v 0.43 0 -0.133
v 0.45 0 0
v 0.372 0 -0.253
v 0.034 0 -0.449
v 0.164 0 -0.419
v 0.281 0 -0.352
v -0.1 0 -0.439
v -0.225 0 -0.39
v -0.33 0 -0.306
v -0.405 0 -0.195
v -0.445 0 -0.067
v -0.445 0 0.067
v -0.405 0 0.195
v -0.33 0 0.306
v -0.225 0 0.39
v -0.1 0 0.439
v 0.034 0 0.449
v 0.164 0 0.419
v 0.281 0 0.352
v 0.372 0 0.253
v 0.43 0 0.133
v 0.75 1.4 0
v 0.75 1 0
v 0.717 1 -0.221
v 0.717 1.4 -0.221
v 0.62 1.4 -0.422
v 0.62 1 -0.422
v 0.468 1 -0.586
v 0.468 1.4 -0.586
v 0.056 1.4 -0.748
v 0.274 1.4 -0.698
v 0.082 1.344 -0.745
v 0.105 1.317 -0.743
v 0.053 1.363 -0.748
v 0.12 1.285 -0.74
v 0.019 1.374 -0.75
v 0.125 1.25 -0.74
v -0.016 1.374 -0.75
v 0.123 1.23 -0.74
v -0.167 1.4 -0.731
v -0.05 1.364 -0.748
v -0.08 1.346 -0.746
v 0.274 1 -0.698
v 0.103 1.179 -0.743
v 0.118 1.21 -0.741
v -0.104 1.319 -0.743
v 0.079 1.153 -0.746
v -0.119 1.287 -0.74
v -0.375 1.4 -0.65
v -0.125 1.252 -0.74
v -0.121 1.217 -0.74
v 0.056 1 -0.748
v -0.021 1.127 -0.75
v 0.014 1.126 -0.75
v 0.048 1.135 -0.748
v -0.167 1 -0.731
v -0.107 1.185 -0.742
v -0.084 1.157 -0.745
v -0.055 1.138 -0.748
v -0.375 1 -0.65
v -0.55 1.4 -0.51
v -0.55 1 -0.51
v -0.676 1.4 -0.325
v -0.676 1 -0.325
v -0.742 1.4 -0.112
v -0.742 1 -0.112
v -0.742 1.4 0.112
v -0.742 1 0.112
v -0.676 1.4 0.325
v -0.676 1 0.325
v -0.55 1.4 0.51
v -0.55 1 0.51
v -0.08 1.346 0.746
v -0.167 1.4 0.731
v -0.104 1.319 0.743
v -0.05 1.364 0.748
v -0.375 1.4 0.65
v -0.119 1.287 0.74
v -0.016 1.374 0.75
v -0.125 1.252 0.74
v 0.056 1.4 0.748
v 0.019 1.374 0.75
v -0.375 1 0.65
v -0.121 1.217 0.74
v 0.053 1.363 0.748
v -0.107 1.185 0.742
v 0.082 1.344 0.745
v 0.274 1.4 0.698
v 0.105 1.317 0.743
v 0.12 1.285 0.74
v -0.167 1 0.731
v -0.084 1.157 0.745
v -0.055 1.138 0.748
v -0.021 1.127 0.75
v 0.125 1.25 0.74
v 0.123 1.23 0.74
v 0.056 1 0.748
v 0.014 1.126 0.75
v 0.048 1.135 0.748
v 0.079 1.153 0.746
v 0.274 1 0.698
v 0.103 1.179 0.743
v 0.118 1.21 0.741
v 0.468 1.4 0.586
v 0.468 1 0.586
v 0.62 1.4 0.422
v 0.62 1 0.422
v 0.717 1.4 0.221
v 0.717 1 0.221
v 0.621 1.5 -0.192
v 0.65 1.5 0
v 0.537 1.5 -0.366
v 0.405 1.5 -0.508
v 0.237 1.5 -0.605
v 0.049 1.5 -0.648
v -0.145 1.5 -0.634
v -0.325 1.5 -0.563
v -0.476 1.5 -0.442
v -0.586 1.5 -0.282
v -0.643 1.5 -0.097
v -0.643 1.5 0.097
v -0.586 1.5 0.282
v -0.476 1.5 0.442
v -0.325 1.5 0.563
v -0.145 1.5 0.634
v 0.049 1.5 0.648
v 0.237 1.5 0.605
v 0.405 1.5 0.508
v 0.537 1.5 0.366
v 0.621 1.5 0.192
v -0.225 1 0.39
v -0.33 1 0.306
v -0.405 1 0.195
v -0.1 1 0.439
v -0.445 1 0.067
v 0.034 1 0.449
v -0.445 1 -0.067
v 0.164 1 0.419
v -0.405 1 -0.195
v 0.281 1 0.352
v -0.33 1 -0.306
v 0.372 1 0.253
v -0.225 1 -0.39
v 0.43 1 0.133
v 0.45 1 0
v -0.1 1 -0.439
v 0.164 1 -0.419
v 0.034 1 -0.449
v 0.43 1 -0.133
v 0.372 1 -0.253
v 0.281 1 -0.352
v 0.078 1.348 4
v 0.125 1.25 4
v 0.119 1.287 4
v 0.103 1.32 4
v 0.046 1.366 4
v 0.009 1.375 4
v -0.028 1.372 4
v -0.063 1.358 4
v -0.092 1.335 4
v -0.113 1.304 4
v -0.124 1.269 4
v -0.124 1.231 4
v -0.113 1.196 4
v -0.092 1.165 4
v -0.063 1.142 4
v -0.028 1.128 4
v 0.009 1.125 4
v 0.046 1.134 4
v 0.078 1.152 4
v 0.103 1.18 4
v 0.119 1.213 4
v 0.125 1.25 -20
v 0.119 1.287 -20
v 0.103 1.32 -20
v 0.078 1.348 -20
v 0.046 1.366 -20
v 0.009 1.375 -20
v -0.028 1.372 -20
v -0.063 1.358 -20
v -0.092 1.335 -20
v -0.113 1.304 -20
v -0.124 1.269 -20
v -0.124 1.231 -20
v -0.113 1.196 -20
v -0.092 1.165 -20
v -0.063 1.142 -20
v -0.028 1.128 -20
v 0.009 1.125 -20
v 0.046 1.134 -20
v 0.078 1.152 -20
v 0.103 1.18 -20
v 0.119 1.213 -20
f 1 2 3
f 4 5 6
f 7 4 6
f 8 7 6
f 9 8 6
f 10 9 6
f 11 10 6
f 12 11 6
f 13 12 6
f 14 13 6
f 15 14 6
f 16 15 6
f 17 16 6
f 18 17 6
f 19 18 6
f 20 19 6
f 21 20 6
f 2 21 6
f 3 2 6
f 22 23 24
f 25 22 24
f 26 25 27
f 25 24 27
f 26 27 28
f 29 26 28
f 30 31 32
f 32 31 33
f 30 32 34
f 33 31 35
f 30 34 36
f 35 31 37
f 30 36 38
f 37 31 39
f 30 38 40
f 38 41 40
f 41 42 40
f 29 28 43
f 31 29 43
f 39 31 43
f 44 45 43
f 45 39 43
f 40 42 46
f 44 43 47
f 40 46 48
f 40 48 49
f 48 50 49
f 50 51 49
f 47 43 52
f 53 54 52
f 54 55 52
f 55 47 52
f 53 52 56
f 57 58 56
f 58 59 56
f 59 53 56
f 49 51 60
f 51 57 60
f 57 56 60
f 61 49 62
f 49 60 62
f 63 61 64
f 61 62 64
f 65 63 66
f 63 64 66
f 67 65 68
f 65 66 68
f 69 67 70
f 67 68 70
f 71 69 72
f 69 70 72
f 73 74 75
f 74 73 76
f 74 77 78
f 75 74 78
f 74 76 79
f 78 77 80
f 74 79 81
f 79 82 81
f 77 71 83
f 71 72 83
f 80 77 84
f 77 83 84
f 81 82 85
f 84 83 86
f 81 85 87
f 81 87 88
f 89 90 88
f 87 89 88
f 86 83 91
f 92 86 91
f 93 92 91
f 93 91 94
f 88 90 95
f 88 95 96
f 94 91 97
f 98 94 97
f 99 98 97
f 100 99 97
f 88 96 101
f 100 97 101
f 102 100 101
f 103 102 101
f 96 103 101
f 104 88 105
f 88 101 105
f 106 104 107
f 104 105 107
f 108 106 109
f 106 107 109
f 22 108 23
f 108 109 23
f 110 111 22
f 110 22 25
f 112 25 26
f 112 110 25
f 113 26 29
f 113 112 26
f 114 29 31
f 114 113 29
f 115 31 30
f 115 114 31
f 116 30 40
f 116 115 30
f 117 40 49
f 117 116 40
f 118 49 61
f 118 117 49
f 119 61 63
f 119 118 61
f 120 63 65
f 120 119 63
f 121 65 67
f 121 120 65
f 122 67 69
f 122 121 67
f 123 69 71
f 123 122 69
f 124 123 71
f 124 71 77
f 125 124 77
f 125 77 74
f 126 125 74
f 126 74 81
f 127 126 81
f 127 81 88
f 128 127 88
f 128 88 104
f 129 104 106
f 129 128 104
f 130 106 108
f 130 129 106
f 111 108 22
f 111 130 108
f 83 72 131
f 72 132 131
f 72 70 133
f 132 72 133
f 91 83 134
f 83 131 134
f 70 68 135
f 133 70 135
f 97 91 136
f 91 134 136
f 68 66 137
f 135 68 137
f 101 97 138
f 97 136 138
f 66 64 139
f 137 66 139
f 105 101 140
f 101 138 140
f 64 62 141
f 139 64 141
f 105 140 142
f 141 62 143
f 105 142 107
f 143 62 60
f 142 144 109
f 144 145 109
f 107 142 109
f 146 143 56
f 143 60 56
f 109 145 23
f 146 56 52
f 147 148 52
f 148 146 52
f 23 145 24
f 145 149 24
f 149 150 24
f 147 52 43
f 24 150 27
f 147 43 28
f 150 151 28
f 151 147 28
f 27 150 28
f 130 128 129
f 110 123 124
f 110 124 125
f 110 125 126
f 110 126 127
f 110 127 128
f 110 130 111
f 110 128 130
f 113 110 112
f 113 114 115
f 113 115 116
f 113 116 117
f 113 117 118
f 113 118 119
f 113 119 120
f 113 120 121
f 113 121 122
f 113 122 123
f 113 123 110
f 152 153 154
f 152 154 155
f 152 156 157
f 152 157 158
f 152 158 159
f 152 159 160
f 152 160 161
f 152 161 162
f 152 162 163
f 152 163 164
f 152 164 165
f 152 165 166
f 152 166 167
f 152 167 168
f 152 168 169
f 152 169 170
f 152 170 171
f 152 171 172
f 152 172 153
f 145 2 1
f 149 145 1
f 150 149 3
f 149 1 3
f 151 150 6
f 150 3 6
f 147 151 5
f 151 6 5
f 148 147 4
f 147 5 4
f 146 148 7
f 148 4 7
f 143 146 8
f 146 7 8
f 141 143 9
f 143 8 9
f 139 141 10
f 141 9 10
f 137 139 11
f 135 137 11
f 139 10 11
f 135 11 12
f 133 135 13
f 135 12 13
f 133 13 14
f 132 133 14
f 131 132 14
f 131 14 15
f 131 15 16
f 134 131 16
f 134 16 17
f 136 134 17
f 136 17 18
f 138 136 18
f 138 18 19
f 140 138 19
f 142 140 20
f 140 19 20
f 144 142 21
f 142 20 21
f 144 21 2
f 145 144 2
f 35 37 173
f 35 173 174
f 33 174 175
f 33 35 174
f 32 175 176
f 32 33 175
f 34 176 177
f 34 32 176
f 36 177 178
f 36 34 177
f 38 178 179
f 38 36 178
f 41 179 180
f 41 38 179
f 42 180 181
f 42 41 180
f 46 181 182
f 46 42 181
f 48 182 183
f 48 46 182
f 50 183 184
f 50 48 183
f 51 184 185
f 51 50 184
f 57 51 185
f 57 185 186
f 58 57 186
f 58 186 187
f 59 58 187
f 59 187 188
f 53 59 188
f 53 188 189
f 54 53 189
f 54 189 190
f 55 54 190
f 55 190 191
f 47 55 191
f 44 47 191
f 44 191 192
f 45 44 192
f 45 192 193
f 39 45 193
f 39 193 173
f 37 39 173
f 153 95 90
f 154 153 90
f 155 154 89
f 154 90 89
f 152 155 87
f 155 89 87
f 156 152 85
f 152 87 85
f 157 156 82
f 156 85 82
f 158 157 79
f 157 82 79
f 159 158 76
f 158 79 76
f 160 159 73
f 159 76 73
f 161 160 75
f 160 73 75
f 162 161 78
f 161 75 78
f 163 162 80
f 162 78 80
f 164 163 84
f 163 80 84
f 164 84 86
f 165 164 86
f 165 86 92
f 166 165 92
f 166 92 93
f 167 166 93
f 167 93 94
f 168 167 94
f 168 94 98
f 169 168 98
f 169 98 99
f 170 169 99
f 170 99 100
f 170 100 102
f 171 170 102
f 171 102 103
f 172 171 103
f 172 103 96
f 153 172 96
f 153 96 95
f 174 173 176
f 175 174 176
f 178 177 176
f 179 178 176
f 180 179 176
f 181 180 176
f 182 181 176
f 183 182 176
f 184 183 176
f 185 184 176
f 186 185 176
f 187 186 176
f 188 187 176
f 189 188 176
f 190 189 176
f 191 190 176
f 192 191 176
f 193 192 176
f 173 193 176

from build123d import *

# Parameters (mm, degrees)
SKETCH1_R                = 0.45
BOSS_EXTRUDE1_DEPTH      = 1
SKETCH2_R                = 0.75
BOSS_EXTRUDE2_DEPTH      = 0.5
SKETCH3_R                = 0.125
BOSS_EXTRUDE3_DEPTH      = 4
BOSS_EXTRUDE3_DEPTH_BACK = 20
CHAMFER1_SIZE            = 0.1


with BuildPart() as part:
    # Sketch1 → Boss-Extrude1 (new body)
    with BuildSketch(Plane(origin=(0, 0, 0), x_dir=(1, 0, 0), z_dir=(0, 1, 0))):
        Circle(SKETCH1_R)
    extrude(amount=BOSS_EXTRUDE1_DEPTH)

    # Sketch2 → Boss-Extrude2 (add)
    with BuildSketch(Plane(origin=(0, 1, 0), x_dir=(1, 0, 0), z_dir=(0, 1, 0))):
        Circle(SKETCH2_R)
    extrude(amount=BOSS_EXTRUDE2_DEPTH)

    # Sketch3 → Boss-Extrude3 (add, two sides)
    with BuildSketch(Plane.XY) as boss_extrude3_sk:
        with Locations((0, 1.25)):
            Circle(SKETCH3_R)
    extrude(amount=BOSS_EXTRUDE3_DEPTH)
    extrude(boss_extrude3_sk.sketch, amount=-BOSS_EXTRUDE3_DEPTH_BACK)

    # Chamfer1
    chamfer1_edges = [part.edges().sort_by_distance(p)[0] for p in [
        (-0.75, 1.5, 0),
    ]]
    chamfer(chamfer1_edges, length=CHAMFER1_SIZE)


solid = part.part
